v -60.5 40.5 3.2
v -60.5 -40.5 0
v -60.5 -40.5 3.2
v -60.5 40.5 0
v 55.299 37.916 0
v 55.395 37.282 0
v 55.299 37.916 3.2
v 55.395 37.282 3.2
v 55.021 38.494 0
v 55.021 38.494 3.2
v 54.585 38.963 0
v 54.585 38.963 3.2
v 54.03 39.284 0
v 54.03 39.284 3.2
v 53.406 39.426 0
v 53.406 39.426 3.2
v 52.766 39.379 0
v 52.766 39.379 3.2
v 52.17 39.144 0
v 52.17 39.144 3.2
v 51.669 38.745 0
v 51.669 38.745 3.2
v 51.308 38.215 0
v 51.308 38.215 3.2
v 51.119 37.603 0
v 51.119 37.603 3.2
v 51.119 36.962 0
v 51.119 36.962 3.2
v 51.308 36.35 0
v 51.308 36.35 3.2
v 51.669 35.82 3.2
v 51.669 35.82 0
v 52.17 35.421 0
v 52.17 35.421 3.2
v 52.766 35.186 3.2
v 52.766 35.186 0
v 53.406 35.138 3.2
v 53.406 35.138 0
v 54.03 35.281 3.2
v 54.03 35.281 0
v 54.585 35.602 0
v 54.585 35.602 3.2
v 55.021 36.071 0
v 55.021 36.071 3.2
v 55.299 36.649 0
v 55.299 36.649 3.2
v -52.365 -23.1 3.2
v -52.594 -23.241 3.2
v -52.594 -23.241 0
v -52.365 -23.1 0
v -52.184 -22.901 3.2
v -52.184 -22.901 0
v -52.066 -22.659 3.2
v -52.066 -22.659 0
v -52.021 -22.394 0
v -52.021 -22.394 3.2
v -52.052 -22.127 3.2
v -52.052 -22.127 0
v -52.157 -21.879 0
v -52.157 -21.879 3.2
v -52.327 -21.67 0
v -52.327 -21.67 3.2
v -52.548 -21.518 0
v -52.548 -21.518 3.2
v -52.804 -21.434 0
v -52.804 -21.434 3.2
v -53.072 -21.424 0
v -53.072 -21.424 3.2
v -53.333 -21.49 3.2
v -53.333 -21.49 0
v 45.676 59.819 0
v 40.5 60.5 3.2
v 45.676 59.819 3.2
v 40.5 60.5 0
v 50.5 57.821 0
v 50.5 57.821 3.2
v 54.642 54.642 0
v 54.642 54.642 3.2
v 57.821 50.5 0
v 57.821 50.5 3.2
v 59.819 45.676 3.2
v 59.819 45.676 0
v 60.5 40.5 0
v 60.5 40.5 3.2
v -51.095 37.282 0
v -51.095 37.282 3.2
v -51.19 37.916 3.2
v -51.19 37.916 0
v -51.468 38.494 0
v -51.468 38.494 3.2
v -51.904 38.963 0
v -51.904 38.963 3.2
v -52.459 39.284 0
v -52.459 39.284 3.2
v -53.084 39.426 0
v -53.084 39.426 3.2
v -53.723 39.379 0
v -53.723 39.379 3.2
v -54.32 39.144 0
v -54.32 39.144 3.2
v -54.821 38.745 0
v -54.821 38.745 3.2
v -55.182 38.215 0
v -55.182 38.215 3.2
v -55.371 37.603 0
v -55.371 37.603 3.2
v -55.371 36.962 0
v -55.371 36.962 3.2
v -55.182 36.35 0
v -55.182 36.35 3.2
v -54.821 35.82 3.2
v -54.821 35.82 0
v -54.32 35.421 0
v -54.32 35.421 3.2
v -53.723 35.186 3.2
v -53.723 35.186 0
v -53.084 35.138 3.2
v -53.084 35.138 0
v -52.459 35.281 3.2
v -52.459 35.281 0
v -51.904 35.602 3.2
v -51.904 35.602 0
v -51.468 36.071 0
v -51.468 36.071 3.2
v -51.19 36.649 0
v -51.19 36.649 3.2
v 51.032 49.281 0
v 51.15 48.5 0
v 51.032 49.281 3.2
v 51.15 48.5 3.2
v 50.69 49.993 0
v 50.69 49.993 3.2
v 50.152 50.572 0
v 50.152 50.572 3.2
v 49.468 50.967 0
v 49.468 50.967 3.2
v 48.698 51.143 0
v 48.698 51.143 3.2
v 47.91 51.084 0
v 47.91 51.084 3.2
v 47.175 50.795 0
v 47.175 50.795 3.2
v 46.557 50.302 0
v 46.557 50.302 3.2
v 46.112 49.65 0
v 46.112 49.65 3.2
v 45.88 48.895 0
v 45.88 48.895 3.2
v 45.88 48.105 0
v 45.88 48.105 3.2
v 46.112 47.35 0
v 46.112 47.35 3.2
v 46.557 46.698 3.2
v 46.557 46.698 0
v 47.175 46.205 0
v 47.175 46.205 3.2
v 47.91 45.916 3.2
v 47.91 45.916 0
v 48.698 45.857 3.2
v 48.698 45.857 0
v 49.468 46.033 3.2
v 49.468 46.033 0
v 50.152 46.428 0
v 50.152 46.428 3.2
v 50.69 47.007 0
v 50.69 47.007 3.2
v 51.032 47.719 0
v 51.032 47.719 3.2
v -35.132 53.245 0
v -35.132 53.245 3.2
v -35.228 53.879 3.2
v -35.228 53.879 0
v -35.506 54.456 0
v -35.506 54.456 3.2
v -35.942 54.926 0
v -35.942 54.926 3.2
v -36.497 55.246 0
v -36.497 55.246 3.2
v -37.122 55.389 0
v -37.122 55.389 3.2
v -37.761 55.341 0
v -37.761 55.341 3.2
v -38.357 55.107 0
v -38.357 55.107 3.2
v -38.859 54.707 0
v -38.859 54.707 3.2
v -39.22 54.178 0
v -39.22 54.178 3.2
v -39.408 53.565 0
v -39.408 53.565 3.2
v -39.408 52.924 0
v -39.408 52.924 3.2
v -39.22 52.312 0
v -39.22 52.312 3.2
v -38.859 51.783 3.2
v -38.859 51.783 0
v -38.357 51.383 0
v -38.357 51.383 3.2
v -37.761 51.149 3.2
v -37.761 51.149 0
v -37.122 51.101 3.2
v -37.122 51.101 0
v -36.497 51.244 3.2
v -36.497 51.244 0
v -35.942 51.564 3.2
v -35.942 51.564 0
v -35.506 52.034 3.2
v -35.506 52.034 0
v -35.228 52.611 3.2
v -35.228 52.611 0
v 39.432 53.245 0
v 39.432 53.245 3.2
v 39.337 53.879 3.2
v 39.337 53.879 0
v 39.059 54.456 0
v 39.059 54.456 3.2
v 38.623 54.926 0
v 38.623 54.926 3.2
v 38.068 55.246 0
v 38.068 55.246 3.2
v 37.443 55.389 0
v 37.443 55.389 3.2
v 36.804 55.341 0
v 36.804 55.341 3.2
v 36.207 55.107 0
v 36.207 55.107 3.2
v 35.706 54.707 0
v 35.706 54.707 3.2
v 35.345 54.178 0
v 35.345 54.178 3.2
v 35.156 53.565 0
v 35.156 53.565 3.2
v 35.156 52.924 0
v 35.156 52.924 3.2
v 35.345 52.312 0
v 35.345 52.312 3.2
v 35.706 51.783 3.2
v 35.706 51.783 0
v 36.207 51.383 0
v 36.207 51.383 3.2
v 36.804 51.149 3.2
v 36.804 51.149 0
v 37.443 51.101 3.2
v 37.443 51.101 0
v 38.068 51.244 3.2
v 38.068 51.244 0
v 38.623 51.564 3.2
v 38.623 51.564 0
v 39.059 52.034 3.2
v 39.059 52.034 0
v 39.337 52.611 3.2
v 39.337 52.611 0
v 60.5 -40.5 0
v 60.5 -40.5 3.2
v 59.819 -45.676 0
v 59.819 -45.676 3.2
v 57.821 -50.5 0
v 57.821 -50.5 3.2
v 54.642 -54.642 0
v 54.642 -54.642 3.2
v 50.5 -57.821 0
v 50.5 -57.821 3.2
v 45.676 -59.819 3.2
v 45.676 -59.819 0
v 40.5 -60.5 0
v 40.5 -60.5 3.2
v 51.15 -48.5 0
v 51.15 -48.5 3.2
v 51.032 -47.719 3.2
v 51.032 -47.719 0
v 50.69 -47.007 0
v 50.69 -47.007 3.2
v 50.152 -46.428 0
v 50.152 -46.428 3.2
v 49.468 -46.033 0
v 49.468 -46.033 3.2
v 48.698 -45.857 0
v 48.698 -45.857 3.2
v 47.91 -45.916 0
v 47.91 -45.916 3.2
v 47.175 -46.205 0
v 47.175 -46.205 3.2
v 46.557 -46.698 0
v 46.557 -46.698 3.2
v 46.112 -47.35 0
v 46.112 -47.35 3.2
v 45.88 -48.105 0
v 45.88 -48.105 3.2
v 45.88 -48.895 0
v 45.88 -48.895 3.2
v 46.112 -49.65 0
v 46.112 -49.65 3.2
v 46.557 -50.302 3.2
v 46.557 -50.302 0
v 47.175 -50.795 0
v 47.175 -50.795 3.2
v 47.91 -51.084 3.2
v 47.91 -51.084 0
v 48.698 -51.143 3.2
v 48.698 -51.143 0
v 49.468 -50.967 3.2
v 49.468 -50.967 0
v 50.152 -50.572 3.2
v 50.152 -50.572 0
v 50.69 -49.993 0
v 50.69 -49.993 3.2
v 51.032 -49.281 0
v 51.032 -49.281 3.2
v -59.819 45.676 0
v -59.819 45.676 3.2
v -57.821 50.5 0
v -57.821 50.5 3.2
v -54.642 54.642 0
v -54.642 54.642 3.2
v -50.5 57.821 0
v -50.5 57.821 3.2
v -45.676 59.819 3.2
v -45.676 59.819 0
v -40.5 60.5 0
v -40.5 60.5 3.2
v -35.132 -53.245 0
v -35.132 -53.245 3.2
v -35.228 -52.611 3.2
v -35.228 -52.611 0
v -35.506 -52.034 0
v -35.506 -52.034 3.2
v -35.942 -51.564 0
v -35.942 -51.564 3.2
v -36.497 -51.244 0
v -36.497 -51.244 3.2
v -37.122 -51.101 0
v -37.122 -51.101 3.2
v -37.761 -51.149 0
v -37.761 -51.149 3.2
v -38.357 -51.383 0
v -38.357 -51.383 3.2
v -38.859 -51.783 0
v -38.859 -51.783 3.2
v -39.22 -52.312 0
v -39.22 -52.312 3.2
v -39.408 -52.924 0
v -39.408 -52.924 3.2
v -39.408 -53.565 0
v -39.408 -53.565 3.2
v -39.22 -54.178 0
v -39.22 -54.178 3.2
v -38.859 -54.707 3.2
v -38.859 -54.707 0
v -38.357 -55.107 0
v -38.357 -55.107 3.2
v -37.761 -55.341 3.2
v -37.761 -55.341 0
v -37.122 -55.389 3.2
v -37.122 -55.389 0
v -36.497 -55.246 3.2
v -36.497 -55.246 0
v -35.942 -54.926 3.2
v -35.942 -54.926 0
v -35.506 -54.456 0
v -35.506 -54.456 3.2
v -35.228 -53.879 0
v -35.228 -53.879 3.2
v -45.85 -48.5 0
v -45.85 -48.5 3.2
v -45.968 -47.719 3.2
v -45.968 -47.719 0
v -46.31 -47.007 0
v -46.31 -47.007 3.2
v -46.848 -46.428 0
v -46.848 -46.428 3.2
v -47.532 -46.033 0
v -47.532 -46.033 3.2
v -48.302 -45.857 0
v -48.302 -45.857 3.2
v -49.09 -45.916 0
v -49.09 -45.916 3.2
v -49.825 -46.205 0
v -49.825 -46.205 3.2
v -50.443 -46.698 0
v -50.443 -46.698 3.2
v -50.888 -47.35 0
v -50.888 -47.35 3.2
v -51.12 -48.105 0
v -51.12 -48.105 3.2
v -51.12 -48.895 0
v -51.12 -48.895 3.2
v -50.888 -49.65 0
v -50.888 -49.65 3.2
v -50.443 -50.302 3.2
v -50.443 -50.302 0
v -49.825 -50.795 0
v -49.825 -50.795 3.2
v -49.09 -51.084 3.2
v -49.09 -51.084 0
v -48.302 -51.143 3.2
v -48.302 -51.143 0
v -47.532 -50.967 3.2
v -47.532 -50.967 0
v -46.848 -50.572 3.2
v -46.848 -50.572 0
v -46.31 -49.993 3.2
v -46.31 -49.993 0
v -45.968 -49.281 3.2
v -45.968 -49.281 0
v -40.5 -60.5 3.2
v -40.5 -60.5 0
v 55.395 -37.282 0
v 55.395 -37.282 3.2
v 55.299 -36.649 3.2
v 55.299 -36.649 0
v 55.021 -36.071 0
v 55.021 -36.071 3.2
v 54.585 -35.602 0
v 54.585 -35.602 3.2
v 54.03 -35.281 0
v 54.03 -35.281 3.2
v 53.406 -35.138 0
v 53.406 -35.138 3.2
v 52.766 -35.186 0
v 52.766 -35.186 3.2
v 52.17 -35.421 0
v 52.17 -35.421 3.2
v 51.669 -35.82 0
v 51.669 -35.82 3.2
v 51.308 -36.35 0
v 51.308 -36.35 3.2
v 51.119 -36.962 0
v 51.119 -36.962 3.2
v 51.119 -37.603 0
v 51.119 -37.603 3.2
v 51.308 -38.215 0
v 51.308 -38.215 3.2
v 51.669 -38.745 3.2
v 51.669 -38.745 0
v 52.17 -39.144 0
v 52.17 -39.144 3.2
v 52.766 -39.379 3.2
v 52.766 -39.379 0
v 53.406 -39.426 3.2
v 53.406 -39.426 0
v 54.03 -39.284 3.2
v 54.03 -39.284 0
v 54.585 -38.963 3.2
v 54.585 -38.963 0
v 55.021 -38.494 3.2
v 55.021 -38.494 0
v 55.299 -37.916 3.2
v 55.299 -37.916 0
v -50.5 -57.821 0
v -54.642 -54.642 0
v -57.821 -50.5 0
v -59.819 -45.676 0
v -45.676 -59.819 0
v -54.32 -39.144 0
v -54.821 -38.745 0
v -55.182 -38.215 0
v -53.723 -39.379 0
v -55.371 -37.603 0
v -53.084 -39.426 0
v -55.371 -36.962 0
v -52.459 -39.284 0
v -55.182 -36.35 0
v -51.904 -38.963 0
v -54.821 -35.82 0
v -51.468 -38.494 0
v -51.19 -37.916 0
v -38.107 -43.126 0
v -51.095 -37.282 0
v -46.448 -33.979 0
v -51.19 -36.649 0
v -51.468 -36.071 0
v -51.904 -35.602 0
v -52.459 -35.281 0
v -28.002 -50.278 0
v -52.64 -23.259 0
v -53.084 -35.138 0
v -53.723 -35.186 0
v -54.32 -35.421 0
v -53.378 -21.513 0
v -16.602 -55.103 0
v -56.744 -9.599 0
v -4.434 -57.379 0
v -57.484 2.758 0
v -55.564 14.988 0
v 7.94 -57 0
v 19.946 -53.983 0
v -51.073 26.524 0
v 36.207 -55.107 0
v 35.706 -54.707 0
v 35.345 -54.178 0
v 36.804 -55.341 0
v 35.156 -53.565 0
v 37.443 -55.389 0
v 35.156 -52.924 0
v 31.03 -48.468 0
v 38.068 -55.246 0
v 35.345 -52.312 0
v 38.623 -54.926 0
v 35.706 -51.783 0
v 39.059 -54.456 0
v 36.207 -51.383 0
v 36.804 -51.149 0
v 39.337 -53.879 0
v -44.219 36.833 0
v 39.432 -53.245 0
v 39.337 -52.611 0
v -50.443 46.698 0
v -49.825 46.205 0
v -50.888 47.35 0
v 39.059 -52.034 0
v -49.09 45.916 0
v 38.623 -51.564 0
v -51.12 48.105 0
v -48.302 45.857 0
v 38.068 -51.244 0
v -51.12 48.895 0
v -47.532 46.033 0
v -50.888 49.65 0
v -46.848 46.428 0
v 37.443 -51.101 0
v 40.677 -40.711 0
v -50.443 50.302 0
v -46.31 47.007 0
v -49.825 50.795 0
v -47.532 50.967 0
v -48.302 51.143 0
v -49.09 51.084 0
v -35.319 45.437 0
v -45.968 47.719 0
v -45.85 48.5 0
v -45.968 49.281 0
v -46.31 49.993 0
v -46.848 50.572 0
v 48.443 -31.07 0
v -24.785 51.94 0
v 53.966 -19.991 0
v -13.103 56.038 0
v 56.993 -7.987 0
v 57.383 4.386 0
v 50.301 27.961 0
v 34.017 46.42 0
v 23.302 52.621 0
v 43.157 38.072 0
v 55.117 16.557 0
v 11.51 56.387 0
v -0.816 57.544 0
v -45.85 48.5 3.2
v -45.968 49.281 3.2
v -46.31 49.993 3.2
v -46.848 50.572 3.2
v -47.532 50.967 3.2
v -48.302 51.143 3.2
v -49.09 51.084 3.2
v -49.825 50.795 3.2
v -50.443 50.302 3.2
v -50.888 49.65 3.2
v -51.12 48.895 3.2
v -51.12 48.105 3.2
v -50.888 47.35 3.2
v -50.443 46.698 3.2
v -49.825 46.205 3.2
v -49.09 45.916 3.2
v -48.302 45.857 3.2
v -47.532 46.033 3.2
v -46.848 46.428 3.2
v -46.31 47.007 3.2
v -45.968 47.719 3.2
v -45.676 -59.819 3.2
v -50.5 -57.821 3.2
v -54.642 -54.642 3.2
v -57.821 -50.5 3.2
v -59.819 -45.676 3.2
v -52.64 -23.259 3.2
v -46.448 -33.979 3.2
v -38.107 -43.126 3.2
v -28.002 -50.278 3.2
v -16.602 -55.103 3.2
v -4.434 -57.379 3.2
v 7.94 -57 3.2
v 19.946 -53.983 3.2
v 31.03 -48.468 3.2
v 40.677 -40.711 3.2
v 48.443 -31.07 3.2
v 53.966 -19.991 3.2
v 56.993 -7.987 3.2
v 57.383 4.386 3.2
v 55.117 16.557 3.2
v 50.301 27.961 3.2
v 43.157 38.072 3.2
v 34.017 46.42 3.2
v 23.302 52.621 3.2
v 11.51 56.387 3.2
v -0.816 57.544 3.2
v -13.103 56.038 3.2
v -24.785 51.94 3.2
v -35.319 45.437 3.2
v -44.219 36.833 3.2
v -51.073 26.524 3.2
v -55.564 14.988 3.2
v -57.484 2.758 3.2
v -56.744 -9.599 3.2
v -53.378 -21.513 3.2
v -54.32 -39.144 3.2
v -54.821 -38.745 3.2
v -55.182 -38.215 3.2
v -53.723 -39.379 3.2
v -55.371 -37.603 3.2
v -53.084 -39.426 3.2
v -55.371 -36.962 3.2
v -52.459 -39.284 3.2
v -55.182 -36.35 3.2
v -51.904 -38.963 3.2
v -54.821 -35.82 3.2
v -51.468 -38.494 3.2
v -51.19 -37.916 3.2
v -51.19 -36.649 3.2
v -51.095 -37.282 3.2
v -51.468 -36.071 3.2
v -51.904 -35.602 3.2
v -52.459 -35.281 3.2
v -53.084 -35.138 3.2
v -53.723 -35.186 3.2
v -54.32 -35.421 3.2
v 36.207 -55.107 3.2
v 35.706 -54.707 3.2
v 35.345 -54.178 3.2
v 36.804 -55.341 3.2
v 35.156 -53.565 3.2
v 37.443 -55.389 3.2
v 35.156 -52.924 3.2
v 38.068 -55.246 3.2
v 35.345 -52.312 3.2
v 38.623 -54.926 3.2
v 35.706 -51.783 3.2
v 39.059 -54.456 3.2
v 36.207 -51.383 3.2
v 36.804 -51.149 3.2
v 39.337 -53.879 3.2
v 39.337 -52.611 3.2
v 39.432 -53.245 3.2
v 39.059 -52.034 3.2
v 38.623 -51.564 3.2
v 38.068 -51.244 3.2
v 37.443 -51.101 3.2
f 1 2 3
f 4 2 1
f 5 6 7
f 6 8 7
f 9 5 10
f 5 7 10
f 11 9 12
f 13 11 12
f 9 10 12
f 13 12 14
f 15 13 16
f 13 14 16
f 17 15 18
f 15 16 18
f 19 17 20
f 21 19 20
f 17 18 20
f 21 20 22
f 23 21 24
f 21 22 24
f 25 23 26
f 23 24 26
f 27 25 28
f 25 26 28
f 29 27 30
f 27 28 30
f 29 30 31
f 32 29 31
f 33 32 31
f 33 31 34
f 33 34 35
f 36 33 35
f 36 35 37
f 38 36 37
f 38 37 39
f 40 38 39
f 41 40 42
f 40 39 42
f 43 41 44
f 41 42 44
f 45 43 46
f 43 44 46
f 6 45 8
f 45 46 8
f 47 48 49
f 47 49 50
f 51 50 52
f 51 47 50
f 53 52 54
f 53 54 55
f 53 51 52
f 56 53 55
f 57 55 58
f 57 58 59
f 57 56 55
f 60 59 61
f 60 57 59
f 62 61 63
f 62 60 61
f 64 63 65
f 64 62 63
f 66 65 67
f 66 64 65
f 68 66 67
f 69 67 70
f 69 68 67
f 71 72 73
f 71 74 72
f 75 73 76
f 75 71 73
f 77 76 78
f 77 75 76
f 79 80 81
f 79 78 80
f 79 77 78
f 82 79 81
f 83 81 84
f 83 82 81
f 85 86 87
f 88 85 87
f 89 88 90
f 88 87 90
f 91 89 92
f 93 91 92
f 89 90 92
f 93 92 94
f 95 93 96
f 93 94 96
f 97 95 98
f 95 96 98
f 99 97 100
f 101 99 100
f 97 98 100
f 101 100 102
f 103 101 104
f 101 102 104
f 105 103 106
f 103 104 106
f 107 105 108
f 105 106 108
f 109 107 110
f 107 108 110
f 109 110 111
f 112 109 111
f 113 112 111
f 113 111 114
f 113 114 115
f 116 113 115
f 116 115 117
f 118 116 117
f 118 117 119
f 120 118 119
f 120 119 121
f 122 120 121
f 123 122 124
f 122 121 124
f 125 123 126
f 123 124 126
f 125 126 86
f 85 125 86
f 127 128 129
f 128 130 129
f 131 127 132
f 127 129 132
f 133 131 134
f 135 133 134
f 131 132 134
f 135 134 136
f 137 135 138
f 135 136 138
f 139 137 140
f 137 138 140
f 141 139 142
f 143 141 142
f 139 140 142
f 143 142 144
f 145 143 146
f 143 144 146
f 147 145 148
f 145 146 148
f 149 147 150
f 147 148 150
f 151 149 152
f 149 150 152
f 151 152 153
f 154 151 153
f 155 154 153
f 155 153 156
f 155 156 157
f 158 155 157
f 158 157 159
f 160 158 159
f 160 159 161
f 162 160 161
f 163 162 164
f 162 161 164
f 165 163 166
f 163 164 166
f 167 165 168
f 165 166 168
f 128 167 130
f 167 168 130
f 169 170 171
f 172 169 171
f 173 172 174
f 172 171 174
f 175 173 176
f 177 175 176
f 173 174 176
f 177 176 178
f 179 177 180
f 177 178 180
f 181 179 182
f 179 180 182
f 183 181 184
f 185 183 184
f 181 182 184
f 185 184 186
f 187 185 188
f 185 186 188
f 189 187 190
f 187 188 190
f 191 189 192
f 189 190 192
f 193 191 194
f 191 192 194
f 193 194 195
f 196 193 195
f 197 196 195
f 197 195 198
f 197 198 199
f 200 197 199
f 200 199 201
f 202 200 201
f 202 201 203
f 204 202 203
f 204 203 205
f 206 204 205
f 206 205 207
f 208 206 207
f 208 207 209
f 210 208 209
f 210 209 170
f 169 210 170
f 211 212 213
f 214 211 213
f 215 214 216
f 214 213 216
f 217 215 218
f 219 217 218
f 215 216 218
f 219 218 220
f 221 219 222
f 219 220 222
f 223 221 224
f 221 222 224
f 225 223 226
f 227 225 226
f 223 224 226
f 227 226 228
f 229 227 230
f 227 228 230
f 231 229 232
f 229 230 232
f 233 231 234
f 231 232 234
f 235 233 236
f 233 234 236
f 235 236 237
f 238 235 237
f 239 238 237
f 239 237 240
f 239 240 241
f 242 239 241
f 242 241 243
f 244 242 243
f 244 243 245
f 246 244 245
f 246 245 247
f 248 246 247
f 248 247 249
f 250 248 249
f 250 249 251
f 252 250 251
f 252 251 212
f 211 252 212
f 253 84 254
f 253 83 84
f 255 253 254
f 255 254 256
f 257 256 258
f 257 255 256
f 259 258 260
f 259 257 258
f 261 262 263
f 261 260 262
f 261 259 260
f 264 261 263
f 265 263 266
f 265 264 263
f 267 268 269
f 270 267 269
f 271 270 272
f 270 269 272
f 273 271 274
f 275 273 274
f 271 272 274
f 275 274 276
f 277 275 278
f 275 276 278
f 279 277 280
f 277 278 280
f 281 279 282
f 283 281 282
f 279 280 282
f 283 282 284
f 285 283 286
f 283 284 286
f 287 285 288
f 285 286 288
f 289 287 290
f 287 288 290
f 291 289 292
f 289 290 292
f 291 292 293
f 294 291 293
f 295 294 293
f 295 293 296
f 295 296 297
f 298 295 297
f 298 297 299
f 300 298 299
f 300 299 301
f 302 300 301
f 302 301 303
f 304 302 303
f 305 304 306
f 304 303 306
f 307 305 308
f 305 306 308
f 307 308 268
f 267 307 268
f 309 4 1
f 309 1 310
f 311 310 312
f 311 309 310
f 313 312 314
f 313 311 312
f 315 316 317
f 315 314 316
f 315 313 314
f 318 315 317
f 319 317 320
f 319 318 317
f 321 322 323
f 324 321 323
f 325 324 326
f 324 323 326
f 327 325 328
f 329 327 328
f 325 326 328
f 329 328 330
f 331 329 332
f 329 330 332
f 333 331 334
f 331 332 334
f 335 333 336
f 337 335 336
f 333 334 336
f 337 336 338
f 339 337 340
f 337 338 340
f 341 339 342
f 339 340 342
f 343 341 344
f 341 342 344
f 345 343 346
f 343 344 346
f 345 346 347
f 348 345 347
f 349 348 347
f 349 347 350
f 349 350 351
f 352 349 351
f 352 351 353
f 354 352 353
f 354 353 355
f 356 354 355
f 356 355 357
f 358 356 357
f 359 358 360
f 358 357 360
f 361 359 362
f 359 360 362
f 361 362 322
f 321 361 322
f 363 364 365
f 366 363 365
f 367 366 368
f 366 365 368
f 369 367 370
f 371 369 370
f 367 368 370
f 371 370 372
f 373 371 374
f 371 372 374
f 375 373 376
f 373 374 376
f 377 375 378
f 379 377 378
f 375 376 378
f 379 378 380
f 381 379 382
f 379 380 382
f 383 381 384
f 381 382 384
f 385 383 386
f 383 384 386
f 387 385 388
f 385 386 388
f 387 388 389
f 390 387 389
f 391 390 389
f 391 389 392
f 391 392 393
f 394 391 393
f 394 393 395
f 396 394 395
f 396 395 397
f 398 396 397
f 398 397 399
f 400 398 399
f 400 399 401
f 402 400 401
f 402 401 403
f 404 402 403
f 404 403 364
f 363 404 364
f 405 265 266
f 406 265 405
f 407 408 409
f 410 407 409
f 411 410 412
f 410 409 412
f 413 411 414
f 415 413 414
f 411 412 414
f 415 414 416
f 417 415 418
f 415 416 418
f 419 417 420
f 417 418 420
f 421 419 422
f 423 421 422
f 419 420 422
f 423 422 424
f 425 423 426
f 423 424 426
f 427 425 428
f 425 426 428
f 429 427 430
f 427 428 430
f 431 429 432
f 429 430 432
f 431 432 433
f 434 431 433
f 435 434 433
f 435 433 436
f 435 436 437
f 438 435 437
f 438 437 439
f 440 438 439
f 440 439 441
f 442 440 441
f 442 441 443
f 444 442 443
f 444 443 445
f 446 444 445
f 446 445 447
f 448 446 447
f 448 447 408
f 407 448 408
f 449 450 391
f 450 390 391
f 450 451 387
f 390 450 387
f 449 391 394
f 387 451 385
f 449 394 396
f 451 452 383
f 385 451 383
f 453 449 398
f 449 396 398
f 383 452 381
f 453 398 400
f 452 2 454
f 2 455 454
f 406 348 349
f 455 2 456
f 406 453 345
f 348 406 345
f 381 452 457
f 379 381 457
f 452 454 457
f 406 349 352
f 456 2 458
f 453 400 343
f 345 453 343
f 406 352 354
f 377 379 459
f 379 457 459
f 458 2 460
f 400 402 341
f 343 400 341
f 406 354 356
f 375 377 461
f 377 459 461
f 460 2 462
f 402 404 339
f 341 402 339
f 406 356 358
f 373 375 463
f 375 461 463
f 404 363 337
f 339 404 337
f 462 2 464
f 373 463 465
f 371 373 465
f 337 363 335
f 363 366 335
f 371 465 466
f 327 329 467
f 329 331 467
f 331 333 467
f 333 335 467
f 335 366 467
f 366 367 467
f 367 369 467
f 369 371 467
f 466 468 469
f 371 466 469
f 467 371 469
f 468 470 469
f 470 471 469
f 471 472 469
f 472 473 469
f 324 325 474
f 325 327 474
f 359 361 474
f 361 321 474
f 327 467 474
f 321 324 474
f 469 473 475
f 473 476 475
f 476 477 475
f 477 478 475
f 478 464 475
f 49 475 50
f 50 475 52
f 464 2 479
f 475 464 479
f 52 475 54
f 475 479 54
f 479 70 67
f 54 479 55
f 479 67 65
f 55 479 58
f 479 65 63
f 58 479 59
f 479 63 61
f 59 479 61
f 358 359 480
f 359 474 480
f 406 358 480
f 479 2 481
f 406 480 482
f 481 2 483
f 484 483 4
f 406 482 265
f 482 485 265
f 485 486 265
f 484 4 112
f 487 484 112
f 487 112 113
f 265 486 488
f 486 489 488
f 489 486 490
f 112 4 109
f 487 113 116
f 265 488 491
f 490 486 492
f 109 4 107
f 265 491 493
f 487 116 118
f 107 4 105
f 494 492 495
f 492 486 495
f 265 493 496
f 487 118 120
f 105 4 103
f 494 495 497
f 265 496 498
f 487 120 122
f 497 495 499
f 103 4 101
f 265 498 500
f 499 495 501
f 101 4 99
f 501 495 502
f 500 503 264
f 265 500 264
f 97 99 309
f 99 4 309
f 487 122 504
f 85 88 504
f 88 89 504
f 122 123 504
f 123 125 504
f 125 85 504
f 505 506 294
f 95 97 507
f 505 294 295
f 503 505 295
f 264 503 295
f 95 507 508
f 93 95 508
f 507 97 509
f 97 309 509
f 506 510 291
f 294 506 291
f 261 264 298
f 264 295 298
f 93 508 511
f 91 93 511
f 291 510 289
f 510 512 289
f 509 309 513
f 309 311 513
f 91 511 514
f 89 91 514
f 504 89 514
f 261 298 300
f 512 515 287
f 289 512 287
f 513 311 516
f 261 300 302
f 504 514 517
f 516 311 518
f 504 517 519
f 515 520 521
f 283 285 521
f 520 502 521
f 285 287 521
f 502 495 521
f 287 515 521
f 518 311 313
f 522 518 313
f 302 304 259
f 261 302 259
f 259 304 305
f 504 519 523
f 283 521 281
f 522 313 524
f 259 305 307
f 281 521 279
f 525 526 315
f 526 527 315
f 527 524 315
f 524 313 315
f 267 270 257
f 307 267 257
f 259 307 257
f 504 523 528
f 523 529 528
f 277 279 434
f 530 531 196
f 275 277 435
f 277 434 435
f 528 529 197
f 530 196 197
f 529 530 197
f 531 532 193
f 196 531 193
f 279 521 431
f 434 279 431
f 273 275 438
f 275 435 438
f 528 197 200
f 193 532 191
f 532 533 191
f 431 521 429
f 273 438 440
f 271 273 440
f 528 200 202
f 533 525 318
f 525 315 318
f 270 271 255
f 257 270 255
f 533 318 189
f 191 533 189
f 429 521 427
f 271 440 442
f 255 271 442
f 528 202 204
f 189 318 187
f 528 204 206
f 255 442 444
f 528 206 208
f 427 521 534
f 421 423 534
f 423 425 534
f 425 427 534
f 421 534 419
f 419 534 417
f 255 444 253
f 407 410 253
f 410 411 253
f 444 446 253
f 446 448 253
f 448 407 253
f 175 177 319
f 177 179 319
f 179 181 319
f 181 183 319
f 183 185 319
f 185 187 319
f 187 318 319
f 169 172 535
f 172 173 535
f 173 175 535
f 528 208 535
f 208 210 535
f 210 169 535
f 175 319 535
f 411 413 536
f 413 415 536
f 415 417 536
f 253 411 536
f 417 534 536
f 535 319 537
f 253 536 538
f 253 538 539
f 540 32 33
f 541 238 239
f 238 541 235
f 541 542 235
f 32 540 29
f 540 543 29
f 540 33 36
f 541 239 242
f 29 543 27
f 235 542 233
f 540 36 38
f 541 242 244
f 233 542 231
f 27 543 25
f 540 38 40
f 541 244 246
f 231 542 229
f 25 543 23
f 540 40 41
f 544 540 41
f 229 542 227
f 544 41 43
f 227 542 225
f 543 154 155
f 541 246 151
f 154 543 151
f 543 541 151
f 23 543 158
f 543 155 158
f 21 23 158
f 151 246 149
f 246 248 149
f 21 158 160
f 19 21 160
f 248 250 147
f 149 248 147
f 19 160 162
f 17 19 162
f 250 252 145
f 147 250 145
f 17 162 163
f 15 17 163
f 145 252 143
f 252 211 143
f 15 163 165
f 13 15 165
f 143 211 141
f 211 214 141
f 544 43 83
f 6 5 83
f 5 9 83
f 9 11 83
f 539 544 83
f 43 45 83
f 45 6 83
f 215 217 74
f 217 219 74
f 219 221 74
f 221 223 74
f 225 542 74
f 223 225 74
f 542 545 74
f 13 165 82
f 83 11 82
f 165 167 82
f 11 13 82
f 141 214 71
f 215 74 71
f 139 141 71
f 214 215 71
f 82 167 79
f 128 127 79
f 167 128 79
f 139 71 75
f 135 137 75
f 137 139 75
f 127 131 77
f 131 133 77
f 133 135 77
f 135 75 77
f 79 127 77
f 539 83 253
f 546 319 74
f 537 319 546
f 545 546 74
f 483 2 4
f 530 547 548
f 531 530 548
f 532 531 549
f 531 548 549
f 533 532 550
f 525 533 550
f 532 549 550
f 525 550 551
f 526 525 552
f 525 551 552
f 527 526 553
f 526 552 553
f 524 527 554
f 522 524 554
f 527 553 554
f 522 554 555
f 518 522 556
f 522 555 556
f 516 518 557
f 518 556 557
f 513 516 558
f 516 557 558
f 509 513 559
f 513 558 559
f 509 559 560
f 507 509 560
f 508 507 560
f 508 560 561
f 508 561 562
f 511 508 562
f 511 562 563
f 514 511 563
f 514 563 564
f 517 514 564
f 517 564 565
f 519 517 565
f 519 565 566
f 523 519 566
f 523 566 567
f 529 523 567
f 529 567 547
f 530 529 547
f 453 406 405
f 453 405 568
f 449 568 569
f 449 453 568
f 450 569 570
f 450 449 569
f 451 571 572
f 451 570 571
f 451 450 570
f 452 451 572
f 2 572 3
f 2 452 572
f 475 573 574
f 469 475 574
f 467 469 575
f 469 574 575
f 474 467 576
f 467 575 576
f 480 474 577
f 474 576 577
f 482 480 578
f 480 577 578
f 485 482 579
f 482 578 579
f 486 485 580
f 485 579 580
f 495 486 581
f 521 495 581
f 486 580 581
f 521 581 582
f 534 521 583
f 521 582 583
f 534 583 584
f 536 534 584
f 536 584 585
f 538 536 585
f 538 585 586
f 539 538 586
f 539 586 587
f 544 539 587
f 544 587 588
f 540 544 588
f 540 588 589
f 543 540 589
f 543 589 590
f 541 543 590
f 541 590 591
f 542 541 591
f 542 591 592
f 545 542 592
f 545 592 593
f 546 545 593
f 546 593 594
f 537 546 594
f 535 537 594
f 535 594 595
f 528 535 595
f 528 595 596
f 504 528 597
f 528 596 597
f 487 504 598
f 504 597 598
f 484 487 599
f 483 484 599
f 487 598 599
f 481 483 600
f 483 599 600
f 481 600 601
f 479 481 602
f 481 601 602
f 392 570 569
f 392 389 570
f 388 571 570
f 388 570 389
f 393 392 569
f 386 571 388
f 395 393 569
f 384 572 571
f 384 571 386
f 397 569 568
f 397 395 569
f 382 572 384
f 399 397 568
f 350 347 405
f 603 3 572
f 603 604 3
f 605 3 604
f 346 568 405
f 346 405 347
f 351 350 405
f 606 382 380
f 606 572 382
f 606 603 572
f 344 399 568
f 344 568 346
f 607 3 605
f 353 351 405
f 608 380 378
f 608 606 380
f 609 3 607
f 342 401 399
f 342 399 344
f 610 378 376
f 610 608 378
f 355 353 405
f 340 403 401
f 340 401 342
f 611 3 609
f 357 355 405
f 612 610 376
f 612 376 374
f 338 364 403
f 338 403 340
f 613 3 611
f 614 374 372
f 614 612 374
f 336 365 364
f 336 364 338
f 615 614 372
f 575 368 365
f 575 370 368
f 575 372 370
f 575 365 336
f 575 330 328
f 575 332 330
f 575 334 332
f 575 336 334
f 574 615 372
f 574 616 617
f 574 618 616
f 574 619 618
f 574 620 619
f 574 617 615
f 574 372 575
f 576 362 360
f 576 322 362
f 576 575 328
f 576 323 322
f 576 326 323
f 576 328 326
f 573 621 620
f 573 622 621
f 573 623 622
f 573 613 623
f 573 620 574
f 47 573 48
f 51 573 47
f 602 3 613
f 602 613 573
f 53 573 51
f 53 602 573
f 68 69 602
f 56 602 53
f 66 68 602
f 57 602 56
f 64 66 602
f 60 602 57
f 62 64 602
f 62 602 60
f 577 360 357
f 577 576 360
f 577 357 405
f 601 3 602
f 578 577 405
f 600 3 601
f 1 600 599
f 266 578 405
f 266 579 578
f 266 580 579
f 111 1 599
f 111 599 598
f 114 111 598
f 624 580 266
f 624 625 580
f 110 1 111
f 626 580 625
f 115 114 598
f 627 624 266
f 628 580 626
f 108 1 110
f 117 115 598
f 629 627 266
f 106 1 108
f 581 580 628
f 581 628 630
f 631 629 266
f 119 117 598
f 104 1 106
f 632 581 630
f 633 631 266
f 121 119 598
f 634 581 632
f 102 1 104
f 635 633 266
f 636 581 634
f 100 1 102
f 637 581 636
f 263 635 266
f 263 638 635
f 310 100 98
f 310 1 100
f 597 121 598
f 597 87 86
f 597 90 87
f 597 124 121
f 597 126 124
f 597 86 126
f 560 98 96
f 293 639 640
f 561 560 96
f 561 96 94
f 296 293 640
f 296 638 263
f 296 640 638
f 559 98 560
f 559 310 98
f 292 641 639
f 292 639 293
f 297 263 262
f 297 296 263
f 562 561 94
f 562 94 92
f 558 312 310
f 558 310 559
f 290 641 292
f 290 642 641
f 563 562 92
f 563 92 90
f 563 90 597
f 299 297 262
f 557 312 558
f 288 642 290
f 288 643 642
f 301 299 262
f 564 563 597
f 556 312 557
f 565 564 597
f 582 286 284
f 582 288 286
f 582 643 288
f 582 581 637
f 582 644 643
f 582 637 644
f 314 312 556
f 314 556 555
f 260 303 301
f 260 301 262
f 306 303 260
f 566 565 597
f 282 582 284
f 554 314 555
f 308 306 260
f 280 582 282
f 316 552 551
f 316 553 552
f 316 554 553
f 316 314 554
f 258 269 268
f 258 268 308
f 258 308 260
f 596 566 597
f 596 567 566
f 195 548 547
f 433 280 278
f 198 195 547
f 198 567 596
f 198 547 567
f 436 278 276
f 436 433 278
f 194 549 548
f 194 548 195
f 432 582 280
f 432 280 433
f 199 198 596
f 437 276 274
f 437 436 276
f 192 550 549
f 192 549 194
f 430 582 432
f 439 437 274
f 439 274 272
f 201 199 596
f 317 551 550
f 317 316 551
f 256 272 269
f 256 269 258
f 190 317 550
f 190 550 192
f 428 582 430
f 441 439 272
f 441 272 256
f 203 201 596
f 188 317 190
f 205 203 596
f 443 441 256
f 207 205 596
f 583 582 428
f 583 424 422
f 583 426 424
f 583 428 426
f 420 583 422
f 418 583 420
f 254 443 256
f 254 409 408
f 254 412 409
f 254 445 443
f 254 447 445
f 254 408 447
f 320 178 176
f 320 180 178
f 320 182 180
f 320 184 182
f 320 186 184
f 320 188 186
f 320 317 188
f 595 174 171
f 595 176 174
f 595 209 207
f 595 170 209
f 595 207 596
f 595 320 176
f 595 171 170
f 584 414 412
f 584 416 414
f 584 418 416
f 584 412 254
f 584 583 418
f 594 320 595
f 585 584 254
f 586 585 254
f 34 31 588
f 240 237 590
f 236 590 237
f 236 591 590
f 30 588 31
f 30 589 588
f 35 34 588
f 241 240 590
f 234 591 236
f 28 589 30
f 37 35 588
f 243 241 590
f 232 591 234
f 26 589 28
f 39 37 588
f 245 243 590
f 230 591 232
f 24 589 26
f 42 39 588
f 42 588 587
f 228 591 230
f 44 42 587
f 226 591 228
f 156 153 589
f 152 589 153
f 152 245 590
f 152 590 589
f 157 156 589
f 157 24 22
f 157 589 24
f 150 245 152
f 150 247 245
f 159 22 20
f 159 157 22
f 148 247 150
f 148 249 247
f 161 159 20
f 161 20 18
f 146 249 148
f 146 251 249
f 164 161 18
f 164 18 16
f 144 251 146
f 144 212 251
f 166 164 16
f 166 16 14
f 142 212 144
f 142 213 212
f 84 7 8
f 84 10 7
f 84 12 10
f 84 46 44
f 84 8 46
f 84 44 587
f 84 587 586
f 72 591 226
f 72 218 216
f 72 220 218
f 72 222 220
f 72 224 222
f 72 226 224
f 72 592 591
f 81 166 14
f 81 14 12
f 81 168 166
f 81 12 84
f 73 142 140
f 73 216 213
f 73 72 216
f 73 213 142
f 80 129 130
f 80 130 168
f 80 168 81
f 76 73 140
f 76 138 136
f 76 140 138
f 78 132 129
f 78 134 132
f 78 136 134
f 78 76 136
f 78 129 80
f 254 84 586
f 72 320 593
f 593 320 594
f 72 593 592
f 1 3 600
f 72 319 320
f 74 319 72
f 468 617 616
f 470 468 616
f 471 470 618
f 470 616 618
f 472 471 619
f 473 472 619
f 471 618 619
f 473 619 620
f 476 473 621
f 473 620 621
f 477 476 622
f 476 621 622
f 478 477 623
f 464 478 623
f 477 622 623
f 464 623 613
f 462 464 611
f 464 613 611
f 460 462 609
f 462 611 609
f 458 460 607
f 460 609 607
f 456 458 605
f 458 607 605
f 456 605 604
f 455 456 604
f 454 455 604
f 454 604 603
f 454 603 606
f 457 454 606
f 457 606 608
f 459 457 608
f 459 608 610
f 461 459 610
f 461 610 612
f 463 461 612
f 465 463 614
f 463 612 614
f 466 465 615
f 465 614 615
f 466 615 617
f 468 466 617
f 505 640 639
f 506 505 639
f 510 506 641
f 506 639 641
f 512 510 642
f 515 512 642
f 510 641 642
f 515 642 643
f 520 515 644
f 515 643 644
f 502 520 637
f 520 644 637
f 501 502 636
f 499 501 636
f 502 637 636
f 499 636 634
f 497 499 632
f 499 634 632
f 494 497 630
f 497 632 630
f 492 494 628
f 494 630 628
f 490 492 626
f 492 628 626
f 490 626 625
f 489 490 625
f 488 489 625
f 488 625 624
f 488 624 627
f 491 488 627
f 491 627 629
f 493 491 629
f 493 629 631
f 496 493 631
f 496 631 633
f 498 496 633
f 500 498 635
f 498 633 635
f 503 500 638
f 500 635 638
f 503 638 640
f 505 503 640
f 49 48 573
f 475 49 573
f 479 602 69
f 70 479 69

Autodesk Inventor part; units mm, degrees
ref_plane "YZ Plane" through (0, 0, 0) normal (1, 0, 0) x (0, 1, 0)
ref_plane "XZ Plane" through (0, 0, 0) normal (0, 1, 0) x (-1, 0, 0)
ref_plane "XY Plane" through (0, 0, 0) normal (0, 0, 1) x (1, 0, 0)
sketch "Sketch1" plane through (0, 0, 0) normal (0, 0, 1) x (1, 0, 0)
  circle A0 centre (0, 0) radius 57.5
  circle A1 centre (0, 0) radius 60.5
  line L0 (-40.5, 60.5) -> (40.5, 60.5)
  line L1 (60.5, 40.5) -> (60.5, -40.5)
  line L2 (40.5, -60.5) -> (-40.5, -60.5)
  line L3 (-60.5, -40.5) -> (-60.5, 40.5)
  arc A2 (-40.5, 60.5) -> (-60.5, 40.5) centre (-40.5, 40.5) ccw
  arc A3 (60.5, 40.5) -> (40.5, 60.5) centre (40.5, 40.5) ccw
  arc A4 (40.5, -60.5) -> (60.5, -40.5) centre (40.5, -40.5) ccw
  arc A5 (-60.5, -40.5) -> (-40.5, -60.5) centre (-40.5, -40.5) ccw
  dimension "d0" = 115
  dimension "d1" = 121
  dimension "d2" = 20
extrude "Extrusion1" add sketch "Sketch1" along normal blind 3.2
sketch "Sketch3" plane through (0, 0, 3.2) normal (0, 0, 1) x (1, 0, 0)
  circle A0 centre (-37.282468, -53.244883) radius 2.15
  circle A1 centre (-48.5, -48.5) radius 2.65
  circle A2 centre (-53.244883, -37.282468) radius 2.15
  circle A3 centre (-53.244883, 37.282468) radius 2.15
  circle A4 centre (-48.5, 48.5) radius 2.65
  circle A5 centre (-37.282468, 53.244883) radius 2.15
  circle A6 centre (37.282468, 53.244883) radius 2.15
  circle A7 centre (48.5, 48.5) radius 2.65
  circle A8 centre (53.244883, 37.282468) radius 2.15
  circle A9 centre (53.244883, -37.282468) radius 2.15
  circle A10 centre (48.5, -48.5) radius 2.65
  circle A11 centre (37.282468, -53.244883) radius 2.15
  point P0 (0, 0)
extrude "Extrusion3" cut sketch "Sketch3" against normal through all
sketch "Sketch4" plane through (0, 0, 3.2) normal (0, 0, 1) x (1, 0, 0)
  arc A0 (-52.049443, -21.979661) -> (-53.351667, -21.444104) centre (-52.970672, -22.368681) ccw
  arc A1 (-52.573656, -23.286493) -> (-52.049443, -21.979661) centre (-52.970672, -22.368681) ccw
  circle A2 centre (-52.970672, -22.368681) radius 0.95
  point P0 (0, 0)
  dimension "d28" = 1.9
extrude "Extrusion4" add sketch "Sketch4" against normal up to surface (3.2 mm away)
sketch "Sketch5" plane through (0, 0, 3.2) normal (0, 0, 1) x (1, 0, 0)
  arc A0 (-52.593886, -23.240766) -> (-53.332999, -21.49049) centre (0, 0) ccw
  circle A1 centre (0, 0) radius 57.55
  arc A2 (-52.593886, -23.240766) -> (-53.332999, -21.49049) centre (-52.970672, -22.368681) ccw
  line L0 (-52.593886, -23.240766) -> (-52.651569, -23.263484)
  line L1 (-53.332999, -21.49049) -> (-53.442689, -21.544242)
  point P0 (-52.640446, -23.259104)
  point P1 (-53.378017, -21.51255)
  dimension "d31" = 0.05
sketch "Sketch5 outline for Extrusion5" plane through (0, 0, 3.2) normal (0, 0, 1) x (1, 0, 0)
  arc A0 (-53.332999, -21.49049) -> (-52.593886, -23.240766) centre (0, 0) cw
  line L0 (-53.378017, -21.51255) -> (-53.332999, -21.49049)
  arc A1 (-52.640446, -23.259104) -> (-53.378017, -21.51255) centre (0, 0) ccw
  line L1 (-52.593886, -23.240766) -> (-52.640446, -23.259104)
extrude "Extrusion5" cut sketch "Sketch5 outline for Extrusion5" against normal through all
properties part number "stator_center_00_alu"
